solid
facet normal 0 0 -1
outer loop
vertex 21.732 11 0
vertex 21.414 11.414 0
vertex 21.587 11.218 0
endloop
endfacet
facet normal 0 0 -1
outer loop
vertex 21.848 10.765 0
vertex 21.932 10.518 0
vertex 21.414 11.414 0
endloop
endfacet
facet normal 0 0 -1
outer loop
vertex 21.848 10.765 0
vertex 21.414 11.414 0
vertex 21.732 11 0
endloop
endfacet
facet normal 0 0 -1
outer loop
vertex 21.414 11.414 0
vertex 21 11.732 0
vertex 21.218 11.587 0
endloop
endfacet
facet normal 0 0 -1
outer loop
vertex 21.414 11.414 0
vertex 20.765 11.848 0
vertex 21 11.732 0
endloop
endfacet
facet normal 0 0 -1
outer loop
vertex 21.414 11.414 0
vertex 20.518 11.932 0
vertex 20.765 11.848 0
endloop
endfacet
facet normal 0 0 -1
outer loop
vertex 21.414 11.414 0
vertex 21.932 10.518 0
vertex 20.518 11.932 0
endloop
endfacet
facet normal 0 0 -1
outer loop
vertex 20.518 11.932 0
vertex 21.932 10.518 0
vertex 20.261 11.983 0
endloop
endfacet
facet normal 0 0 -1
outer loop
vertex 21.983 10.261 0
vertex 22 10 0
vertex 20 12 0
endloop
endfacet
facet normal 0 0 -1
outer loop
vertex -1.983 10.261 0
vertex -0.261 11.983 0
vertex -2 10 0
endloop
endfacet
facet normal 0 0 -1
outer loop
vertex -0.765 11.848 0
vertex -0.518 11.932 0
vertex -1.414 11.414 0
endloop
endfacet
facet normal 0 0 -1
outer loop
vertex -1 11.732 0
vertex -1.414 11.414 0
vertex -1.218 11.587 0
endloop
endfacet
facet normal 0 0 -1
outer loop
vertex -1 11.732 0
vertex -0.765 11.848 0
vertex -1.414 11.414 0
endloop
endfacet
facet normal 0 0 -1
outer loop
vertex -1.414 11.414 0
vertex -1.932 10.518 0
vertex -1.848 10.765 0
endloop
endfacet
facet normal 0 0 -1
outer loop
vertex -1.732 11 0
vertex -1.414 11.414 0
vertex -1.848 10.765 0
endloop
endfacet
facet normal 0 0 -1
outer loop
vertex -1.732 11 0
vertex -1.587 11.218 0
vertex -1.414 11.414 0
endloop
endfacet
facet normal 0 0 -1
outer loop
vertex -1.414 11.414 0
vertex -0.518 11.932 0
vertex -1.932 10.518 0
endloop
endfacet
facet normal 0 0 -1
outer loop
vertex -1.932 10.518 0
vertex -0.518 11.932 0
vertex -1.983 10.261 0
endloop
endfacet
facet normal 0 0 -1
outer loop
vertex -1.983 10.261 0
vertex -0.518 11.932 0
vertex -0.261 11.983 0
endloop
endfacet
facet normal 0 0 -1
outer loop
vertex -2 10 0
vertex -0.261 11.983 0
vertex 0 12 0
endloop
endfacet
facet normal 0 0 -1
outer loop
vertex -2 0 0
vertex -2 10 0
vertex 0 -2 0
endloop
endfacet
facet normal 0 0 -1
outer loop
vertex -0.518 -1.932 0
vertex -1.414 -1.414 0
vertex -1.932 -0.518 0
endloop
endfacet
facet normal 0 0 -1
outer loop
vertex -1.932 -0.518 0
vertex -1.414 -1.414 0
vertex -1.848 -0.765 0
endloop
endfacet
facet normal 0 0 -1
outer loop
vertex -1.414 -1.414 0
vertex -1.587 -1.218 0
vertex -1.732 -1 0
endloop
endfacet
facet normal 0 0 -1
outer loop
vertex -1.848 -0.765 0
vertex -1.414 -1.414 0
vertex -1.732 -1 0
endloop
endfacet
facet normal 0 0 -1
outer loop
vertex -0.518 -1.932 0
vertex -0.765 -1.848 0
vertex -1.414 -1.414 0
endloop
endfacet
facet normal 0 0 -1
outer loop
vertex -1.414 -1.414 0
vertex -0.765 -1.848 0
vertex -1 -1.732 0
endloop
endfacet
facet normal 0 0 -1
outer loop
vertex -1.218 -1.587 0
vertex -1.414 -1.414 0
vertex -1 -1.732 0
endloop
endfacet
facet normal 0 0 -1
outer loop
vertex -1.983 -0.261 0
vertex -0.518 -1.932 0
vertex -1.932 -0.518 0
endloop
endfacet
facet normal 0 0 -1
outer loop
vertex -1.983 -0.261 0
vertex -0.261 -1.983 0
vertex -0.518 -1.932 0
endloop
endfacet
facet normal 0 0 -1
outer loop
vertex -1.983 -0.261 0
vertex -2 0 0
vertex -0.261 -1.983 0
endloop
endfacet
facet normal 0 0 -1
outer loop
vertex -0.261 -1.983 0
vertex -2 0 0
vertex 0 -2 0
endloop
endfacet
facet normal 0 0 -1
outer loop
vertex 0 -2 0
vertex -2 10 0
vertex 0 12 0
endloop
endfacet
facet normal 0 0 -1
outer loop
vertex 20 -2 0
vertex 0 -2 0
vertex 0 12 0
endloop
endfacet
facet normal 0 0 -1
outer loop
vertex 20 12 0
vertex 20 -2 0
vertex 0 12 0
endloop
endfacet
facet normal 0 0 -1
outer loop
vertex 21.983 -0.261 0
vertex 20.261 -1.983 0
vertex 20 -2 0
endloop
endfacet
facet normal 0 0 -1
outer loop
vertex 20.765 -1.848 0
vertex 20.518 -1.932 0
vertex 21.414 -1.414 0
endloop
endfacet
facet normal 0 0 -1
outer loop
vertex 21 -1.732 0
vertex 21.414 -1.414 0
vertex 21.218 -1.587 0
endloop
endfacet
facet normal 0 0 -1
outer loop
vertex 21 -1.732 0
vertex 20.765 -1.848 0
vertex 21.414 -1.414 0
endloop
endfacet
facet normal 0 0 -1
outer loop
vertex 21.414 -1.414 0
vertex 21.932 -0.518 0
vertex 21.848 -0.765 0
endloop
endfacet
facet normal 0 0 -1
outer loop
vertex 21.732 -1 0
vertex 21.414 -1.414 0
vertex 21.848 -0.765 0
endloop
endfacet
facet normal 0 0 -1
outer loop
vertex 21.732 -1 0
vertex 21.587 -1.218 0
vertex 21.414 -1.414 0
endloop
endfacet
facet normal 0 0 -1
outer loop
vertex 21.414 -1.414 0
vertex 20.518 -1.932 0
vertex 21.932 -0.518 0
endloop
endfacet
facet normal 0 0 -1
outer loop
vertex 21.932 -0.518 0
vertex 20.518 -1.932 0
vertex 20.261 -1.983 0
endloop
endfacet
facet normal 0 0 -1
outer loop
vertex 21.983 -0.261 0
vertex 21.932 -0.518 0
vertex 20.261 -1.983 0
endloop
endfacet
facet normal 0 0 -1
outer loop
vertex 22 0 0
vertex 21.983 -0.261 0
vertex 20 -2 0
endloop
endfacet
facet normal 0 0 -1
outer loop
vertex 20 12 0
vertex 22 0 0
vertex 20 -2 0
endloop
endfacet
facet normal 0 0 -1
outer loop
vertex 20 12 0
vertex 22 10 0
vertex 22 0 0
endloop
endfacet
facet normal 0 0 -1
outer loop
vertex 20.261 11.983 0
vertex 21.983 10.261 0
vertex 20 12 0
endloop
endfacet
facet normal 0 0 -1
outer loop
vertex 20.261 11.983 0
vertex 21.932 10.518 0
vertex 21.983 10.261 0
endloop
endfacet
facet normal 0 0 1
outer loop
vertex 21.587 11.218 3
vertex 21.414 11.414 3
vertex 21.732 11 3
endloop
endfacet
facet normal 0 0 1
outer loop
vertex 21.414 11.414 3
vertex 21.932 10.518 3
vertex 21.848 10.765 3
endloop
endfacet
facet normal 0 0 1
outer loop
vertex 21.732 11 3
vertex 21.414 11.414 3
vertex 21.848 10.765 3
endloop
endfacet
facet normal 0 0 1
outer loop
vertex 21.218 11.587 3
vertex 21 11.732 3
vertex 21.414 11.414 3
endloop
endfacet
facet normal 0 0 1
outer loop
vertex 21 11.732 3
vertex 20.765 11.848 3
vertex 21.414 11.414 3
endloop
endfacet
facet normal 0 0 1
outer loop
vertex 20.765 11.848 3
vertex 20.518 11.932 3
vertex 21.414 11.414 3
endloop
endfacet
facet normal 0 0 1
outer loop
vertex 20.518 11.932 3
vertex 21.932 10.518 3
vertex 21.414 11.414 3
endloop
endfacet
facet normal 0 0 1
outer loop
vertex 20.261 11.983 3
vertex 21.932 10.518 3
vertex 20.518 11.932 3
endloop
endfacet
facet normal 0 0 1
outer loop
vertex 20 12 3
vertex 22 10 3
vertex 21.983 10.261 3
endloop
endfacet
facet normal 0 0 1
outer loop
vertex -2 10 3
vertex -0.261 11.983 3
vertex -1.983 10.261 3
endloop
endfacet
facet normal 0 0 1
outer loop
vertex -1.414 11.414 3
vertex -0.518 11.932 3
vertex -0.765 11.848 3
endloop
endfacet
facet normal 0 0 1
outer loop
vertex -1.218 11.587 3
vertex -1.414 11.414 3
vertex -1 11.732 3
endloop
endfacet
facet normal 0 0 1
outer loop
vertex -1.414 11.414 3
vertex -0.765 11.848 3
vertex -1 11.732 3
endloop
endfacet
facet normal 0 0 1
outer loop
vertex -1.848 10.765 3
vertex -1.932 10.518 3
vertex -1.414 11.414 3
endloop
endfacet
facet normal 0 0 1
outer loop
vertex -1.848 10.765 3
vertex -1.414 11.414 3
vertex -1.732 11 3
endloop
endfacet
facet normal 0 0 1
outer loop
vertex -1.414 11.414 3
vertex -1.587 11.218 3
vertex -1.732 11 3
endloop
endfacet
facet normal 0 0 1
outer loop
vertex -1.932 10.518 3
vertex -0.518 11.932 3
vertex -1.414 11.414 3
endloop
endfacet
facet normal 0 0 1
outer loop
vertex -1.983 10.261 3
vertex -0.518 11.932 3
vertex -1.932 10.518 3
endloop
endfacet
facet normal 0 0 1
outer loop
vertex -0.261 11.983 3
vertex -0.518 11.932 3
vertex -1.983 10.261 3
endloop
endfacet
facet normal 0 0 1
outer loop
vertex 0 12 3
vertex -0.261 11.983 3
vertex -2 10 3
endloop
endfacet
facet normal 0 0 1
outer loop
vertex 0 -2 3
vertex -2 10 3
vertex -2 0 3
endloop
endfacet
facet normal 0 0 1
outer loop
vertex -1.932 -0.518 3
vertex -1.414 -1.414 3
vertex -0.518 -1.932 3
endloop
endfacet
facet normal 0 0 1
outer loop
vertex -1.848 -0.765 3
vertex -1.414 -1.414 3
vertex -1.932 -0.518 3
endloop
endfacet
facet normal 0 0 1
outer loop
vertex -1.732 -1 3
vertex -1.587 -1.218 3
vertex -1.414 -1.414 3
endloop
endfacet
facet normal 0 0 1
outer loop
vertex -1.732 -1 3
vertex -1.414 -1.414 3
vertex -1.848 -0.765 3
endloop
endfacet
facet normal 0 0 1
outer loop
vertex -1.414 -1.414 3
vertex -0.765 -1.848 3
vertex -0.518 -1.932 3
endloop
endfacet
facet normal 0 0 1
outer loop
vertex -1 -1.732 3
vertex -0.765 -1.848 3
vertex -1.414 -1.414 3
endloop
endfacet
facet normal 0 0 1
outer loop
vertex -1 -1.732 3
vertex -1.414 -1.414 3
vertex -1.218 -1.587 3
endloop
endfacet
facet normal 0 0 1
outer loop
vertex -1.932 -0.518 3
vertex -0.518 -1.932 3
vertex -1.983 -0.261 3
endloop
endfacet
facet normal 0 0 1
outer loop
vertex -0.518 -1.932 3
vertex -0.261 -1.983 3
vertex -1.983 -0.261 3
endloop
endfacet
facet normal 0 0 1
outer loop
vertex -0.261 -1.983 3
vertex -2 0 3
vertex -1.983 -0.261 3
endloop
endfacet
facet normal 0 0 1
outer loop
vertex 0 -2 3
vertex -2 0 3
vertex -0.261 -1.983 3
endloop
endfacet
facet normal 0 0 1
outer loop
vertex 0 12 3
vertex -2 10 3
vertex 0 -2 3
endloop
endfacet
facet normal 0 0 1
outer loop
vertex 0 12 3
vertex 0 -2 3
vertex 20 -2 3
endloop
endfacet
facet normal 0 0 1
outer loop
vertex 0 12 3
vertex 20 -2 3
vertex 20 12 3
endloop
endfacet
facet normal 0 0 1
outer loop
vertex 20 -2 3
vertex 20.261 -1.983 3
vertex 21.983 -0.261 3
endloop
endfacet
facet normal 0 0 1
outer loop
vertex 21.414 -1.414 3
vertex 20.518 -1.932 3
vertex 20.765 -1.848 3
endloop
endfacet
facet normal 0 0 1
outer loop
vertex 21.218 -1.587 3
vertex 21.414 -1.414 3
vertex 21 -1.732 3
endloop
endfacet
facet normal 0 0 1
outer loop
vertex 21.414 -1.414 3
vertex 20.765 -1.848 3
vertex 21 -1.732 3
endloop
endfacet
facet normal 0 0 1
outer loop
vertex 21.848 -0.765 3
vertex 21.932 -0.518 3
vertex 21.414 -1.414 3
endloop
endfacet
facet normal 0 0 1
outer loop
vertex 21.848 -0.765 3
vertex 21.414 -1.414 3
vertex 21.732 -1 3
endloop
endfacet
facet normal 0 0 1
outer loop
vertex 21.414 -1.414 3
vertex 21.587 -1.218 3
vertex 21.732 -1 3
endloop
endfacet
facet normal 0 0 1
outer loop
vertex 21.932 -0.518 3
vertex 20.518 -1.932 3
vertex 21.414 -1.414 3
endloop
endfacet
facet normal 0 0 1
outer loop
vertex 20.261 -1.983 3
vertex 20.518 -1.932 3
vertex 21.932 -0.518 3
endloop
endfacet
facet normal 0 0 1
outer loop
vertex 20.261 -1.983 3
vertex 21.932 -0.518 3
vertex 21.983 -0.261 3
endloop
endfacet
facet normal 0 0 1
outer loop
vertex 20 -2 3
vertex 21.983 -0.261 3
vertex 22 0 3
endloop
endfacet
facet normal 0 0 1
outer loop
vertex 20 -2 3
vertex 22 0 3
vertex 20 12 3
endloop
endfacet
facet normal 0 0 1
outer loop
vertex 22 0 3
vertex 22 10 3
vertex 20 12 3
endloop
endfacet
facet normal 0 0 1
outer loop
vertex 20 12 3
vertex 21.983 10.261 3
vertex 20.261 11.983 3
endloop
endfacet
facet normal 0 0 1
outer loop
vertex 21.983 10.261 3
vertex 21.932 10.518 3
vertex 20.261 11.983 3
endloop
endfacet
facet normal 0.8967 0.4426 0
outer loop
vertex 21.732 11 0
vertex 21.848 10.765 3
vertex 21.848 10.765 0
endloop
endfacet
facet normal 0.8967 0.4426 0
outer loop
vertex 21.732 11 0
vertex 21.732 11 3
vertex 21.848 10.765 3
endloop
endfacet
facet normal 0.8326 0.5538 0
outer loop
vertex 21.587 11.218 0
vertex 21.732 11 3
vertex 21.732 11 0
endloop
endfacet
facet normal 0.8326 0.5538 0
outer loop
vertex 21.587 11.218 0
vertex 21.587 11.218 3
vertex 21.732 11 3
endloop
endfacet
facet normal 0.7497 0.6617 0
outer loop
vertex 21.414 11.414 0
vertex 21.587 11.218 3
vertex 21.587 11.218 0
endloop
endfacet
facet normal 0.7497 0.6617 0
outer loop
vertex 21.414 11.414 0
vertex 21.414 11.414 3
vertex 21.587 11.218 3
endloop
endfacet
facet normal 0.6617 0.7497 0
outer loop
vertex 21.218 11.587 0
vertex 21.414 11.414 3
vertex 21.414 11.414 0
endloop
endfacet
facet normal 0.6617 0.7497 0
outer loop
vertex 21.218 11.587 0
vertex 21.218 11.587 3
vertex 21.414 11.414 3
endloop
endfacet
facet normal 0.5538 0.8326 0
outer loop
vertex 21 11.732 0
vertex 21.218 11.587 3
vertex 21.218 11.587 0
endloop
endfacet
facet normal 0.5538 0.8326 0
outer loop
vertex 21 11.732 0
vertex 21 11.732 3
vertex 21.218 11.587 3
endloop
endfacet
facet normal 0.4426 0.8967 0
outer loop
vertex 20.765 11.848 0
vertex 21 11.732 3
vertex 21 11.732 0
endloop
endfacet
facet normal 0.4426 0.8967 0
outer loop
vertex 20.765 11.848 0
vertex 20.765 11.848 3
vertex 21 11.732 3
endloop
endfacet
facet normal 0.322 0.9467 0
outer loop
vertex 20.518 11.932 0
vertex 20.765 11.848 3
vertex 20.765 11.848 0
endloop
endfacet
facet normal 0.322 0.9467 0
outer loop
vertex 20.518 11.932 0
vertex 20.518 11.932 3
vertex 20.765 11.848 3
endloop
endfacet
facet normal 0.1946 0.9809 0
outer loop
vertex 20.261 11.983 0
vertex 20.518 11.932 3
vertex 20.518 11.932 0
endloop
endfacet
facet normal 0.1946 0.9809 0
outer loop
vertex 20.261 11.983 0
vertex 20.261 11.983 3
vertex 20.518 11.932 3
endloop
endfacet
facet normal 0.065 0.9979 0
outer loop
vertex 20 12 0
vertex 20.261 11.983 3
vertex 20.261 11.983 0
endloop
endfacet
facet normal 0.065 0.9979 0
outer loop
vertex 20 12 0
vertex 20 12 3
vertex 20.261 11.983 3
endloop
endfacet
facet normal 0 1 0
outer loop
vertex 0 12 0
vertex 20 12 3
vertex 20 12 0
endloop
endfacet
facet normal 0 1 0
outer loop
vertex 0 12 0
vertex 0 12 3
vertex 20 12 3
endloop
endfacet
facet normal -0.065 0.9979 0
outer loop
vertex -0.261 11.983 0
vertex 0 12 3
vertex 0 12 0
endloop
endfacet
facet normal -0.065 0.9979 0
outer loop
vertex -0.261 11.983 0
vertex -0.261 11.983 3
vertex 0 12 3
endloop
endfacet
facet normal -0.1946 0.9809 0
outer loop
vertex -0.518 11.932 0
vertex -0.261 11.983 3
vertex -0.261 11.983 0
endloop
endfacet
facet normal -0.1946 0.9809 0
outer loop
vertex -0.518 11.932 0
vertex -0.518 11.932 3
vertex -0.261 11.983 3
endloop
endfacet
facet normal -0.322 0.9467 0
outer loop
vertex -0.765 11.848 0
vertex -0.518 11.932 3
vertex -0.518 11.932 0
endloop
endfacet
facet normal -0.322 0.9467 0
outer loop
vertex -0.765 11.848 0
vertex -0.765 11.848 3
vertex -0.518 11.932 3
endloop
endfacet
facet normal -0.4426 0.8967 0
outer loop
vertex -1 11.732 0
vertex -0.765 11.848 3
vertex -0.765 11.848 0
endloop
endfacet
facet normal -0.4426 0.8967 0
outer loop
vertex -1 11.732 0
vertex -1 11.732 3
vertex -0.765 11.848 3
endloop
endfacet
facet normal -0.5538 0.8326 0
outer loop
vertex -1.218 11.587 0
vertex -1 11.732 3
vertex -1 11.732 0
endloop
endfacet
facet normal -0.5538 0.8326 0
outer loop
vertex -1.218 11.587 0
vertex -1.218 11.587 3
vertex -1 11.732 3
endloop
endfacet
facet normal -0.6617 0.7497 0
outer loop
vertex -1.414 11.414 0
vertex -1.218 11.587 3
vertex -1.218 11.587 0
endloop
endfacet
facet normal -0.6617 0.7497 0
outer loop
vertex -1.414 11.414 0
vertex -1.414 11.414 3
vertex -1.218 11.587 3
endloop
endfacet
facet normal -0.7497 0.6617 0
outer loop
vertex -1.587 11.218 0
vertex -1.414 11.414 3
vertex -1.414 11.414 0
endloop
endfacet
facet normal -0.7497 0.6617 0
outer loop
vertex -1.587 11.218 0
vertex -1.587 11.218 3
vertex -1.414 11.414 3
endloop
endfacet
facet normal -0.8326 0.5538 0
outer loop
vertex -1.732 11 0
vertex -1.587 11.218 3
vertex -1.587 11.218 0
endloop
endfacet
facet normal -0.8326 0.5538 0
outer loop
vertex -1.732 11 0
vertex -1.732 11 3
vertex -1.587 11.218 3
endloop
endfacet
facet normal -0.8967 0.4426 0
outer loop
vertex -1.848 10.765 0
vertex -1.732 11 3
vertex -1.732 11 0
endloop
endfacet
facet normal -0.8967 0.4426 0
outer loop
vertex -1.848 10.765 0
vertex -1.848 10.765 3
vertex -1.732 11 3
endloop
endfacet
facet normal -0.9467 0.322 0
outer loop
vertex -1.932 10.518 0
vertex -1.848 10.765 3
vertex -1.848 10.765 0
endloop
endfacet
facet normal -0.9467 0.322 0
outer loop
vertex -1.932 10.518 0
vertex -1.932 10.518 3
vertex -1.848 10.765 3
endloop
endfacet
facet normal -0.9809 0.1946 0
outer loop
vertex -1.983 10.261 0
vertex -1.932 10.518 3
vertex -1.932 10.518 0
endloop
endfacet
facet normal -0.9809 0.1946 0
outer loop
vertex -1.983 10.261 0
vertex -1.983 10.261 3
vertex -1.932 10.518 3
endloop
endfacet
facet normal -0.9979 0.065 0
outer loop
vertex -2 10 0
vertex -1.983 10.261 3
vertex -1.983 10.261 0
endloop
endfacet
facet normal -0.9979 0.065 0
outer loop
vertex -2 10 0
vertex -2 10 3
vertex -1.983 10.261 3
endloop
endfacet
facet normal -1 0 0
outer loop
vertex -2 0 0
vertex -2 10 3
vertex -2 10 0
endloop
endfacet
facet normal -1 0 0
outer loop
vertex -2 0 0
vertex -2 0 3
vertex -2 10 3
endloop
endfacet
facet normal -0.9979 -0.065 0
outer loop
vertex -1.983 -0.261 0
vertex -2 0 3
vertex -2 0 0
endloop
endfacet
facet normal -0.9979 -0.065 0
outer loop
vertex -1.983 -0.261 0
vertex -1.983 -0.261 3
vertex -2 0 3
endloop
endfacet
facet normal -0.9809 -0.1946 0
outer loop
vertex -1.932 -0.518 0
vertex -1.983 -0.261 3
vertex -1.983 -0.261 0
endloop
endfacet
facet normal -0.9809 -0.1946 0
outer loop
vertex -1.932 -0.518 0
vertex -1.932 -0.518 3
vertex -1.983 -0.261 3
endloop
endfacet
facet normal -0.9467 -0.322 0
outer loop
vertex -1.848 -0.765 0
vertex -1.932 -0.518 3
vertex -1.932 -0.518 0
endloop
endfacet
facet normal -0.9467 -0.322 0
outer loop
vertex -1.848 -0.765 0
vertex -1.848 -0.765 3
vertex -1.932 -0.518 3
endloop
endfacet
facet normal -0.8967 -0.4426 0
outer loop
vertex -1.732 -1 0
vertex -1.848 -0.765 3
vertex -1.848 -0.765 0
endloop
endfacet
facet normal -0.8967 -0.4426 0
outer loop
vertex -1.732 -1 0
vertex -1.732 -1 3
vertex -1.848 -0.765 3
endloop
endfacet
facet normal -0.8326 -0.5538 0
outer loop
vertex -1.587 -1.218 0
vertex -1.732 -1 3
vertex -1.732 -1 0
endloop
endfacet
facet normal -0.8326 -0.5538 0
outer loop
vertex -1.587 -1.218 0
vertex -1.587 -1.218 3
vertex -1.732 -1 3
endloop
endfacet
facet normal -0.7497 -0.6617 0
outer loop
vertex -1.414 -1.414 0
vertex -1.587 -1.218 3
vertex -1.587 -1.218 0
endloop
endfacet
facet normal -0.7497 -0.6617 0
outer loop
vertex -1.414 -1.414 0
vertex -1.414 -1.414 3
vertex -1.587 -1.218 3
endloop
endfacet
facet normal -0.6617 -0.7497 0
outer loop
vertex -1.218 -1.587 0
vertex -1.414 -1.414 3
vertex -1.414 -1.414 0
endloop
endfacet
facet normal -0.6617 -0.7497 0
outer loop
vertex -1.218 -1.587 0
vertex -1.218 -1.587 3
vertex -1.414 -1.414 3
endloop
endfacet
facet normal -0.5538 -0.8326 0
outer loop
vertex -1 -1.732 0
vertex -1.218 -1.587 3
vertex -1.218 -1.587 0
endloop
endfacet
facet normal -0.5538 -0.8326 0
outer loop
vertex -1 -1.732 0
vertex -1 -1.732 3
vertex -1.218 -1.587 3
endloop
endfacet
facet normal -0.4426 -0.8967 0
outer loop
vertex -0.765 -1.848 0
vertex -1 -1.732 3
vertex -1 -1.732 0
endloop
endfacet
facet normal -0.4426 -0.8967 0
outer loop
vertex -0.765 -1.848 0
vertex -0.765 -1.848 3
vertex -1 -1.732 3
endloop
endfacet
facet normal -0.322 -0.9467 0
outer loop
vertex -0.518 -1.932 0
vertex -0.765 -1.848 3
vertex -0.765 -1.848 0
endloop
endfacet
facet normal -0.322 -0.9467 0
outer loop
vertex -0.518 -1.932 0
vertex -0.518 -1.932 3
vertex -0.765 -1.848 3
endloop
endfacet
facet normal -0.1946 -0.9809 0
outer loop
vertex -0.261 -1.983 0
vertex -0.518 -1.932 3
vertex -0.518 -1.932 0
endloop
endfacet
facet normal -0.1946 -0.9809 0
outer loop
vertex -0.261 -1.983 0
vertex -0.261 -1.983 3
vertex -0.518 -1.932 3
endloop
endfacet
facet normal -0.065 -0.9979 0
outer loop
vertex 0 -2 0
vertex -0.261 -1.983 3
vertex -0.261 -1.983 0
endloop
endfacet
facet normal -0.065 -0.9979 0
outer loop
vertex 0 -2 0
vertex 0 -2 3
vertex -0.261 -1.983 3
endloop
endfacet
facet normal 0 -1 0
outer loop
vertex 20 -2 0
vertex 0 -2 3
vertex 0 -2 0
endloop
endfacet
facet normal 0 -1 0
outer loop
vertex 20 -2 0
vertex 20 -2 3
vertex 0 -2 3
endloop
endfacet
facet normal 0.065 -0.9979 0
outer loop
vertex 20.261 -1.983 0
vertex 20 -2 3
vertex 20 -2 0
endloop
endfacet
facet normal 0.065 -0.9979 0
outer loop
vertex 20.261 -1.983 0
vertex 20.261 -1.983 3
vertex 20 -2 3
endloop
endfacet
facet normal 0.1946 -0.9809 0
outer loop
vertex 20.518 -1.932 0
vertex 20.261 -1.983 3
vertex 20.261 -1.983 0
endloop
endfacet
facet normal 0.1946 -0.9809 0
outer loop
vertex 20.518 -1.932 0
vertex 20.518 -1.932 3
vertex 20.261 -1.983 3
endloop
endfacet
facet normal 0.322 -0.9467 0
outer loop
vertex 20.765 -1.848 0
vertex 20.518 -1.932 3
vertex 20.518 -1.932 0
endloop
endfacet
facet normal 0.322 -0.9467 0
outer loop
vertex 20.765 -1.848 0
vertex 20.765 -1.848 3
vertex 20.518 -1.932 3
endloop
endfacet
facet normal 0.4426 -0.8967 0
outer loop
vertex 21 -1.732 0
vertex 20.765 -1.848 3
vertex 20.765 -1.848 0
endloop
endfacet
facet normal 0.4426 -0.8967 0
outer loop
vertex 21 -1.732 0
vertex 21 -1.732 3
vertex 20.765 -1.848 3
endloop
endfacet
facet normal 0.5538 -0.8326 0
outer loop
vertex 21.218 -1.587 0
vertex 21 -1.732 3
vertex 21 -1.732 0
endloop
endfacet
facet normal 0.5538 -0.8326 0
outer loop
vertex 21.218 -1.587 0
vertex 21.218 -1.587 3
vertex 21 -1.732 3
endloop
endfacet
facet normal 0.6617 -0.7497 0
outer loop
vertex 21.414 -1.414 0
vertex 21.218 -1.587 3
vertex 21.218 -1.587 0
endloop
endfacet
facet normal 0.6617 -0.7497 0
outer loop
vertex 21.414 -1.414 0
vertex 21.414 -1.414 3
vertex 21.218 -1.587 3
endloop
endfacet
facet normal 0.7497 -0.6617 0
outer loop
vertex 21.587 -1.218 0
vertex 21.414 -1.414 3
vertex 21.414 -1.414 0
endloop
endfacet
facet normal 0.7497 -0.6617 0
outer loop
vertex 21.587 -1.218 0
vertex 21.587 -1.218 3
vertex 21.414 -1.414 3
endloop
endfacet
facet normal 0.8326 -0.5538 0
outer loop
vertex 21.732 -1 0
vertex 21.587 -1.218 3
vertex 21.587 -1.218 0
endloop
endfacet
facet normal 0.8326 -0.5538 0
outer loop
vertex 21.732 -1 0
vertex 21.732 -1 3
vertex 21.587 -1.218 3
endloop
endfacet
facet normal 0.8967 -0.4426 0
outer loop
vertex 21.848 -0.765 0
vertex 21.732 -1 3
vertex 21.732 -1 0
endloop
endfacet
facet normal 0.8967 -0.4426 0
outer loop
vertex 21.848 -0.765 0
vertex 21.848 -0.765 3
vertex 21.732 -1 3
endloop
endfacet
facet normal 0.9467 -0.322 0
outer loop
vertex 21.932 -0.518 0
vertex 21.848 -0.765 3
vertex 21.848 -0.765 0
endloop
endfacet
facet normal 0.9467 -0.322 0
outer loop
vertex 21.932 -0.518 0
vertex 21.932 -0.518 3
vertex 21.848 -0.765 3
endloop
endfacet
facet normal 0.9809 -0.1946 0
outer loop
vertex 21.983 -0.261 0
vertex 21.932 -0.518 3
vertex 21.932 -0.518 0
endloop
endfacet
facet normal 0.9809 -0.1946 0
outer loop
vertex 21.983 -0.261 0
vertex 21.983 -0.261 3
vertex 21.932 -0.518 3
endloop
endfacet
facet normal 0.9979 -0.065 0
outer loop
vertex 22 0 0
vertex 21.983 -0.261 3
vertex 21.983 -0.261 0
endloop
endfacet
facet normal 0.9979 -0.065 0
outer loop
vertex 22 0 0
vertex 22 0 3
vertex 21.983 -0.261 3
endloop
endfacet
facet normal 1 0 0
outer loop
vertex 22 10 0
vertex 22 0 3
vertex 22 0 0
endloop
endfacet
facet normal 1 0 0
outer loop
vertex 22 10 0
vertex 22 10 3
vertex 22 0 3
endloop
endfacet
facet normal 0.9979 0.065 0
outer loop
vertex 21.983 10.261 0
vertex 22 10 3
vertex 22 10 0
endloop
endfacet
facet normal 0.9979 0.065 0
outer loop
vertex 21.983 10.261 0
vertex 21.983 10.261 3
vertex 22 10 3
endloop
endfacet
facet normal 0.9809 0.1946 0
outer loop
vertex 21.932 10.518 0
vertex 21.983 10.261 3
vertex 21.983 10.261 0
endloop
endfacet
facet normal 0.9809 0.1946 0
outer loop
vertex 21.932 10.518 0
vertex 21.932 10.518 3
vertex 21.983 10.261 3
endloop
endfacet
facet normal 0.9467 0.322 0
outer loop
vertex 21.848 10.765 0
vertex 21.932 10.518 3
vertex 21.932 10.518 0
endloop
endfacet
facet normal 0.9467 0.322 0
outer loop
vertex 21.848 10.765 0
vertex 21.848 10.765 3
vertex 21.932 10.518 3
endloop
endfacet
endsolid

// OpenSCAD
linear_extrude(3) minkowski() { square([20, 10]); circle(2, $fn = 48); }
